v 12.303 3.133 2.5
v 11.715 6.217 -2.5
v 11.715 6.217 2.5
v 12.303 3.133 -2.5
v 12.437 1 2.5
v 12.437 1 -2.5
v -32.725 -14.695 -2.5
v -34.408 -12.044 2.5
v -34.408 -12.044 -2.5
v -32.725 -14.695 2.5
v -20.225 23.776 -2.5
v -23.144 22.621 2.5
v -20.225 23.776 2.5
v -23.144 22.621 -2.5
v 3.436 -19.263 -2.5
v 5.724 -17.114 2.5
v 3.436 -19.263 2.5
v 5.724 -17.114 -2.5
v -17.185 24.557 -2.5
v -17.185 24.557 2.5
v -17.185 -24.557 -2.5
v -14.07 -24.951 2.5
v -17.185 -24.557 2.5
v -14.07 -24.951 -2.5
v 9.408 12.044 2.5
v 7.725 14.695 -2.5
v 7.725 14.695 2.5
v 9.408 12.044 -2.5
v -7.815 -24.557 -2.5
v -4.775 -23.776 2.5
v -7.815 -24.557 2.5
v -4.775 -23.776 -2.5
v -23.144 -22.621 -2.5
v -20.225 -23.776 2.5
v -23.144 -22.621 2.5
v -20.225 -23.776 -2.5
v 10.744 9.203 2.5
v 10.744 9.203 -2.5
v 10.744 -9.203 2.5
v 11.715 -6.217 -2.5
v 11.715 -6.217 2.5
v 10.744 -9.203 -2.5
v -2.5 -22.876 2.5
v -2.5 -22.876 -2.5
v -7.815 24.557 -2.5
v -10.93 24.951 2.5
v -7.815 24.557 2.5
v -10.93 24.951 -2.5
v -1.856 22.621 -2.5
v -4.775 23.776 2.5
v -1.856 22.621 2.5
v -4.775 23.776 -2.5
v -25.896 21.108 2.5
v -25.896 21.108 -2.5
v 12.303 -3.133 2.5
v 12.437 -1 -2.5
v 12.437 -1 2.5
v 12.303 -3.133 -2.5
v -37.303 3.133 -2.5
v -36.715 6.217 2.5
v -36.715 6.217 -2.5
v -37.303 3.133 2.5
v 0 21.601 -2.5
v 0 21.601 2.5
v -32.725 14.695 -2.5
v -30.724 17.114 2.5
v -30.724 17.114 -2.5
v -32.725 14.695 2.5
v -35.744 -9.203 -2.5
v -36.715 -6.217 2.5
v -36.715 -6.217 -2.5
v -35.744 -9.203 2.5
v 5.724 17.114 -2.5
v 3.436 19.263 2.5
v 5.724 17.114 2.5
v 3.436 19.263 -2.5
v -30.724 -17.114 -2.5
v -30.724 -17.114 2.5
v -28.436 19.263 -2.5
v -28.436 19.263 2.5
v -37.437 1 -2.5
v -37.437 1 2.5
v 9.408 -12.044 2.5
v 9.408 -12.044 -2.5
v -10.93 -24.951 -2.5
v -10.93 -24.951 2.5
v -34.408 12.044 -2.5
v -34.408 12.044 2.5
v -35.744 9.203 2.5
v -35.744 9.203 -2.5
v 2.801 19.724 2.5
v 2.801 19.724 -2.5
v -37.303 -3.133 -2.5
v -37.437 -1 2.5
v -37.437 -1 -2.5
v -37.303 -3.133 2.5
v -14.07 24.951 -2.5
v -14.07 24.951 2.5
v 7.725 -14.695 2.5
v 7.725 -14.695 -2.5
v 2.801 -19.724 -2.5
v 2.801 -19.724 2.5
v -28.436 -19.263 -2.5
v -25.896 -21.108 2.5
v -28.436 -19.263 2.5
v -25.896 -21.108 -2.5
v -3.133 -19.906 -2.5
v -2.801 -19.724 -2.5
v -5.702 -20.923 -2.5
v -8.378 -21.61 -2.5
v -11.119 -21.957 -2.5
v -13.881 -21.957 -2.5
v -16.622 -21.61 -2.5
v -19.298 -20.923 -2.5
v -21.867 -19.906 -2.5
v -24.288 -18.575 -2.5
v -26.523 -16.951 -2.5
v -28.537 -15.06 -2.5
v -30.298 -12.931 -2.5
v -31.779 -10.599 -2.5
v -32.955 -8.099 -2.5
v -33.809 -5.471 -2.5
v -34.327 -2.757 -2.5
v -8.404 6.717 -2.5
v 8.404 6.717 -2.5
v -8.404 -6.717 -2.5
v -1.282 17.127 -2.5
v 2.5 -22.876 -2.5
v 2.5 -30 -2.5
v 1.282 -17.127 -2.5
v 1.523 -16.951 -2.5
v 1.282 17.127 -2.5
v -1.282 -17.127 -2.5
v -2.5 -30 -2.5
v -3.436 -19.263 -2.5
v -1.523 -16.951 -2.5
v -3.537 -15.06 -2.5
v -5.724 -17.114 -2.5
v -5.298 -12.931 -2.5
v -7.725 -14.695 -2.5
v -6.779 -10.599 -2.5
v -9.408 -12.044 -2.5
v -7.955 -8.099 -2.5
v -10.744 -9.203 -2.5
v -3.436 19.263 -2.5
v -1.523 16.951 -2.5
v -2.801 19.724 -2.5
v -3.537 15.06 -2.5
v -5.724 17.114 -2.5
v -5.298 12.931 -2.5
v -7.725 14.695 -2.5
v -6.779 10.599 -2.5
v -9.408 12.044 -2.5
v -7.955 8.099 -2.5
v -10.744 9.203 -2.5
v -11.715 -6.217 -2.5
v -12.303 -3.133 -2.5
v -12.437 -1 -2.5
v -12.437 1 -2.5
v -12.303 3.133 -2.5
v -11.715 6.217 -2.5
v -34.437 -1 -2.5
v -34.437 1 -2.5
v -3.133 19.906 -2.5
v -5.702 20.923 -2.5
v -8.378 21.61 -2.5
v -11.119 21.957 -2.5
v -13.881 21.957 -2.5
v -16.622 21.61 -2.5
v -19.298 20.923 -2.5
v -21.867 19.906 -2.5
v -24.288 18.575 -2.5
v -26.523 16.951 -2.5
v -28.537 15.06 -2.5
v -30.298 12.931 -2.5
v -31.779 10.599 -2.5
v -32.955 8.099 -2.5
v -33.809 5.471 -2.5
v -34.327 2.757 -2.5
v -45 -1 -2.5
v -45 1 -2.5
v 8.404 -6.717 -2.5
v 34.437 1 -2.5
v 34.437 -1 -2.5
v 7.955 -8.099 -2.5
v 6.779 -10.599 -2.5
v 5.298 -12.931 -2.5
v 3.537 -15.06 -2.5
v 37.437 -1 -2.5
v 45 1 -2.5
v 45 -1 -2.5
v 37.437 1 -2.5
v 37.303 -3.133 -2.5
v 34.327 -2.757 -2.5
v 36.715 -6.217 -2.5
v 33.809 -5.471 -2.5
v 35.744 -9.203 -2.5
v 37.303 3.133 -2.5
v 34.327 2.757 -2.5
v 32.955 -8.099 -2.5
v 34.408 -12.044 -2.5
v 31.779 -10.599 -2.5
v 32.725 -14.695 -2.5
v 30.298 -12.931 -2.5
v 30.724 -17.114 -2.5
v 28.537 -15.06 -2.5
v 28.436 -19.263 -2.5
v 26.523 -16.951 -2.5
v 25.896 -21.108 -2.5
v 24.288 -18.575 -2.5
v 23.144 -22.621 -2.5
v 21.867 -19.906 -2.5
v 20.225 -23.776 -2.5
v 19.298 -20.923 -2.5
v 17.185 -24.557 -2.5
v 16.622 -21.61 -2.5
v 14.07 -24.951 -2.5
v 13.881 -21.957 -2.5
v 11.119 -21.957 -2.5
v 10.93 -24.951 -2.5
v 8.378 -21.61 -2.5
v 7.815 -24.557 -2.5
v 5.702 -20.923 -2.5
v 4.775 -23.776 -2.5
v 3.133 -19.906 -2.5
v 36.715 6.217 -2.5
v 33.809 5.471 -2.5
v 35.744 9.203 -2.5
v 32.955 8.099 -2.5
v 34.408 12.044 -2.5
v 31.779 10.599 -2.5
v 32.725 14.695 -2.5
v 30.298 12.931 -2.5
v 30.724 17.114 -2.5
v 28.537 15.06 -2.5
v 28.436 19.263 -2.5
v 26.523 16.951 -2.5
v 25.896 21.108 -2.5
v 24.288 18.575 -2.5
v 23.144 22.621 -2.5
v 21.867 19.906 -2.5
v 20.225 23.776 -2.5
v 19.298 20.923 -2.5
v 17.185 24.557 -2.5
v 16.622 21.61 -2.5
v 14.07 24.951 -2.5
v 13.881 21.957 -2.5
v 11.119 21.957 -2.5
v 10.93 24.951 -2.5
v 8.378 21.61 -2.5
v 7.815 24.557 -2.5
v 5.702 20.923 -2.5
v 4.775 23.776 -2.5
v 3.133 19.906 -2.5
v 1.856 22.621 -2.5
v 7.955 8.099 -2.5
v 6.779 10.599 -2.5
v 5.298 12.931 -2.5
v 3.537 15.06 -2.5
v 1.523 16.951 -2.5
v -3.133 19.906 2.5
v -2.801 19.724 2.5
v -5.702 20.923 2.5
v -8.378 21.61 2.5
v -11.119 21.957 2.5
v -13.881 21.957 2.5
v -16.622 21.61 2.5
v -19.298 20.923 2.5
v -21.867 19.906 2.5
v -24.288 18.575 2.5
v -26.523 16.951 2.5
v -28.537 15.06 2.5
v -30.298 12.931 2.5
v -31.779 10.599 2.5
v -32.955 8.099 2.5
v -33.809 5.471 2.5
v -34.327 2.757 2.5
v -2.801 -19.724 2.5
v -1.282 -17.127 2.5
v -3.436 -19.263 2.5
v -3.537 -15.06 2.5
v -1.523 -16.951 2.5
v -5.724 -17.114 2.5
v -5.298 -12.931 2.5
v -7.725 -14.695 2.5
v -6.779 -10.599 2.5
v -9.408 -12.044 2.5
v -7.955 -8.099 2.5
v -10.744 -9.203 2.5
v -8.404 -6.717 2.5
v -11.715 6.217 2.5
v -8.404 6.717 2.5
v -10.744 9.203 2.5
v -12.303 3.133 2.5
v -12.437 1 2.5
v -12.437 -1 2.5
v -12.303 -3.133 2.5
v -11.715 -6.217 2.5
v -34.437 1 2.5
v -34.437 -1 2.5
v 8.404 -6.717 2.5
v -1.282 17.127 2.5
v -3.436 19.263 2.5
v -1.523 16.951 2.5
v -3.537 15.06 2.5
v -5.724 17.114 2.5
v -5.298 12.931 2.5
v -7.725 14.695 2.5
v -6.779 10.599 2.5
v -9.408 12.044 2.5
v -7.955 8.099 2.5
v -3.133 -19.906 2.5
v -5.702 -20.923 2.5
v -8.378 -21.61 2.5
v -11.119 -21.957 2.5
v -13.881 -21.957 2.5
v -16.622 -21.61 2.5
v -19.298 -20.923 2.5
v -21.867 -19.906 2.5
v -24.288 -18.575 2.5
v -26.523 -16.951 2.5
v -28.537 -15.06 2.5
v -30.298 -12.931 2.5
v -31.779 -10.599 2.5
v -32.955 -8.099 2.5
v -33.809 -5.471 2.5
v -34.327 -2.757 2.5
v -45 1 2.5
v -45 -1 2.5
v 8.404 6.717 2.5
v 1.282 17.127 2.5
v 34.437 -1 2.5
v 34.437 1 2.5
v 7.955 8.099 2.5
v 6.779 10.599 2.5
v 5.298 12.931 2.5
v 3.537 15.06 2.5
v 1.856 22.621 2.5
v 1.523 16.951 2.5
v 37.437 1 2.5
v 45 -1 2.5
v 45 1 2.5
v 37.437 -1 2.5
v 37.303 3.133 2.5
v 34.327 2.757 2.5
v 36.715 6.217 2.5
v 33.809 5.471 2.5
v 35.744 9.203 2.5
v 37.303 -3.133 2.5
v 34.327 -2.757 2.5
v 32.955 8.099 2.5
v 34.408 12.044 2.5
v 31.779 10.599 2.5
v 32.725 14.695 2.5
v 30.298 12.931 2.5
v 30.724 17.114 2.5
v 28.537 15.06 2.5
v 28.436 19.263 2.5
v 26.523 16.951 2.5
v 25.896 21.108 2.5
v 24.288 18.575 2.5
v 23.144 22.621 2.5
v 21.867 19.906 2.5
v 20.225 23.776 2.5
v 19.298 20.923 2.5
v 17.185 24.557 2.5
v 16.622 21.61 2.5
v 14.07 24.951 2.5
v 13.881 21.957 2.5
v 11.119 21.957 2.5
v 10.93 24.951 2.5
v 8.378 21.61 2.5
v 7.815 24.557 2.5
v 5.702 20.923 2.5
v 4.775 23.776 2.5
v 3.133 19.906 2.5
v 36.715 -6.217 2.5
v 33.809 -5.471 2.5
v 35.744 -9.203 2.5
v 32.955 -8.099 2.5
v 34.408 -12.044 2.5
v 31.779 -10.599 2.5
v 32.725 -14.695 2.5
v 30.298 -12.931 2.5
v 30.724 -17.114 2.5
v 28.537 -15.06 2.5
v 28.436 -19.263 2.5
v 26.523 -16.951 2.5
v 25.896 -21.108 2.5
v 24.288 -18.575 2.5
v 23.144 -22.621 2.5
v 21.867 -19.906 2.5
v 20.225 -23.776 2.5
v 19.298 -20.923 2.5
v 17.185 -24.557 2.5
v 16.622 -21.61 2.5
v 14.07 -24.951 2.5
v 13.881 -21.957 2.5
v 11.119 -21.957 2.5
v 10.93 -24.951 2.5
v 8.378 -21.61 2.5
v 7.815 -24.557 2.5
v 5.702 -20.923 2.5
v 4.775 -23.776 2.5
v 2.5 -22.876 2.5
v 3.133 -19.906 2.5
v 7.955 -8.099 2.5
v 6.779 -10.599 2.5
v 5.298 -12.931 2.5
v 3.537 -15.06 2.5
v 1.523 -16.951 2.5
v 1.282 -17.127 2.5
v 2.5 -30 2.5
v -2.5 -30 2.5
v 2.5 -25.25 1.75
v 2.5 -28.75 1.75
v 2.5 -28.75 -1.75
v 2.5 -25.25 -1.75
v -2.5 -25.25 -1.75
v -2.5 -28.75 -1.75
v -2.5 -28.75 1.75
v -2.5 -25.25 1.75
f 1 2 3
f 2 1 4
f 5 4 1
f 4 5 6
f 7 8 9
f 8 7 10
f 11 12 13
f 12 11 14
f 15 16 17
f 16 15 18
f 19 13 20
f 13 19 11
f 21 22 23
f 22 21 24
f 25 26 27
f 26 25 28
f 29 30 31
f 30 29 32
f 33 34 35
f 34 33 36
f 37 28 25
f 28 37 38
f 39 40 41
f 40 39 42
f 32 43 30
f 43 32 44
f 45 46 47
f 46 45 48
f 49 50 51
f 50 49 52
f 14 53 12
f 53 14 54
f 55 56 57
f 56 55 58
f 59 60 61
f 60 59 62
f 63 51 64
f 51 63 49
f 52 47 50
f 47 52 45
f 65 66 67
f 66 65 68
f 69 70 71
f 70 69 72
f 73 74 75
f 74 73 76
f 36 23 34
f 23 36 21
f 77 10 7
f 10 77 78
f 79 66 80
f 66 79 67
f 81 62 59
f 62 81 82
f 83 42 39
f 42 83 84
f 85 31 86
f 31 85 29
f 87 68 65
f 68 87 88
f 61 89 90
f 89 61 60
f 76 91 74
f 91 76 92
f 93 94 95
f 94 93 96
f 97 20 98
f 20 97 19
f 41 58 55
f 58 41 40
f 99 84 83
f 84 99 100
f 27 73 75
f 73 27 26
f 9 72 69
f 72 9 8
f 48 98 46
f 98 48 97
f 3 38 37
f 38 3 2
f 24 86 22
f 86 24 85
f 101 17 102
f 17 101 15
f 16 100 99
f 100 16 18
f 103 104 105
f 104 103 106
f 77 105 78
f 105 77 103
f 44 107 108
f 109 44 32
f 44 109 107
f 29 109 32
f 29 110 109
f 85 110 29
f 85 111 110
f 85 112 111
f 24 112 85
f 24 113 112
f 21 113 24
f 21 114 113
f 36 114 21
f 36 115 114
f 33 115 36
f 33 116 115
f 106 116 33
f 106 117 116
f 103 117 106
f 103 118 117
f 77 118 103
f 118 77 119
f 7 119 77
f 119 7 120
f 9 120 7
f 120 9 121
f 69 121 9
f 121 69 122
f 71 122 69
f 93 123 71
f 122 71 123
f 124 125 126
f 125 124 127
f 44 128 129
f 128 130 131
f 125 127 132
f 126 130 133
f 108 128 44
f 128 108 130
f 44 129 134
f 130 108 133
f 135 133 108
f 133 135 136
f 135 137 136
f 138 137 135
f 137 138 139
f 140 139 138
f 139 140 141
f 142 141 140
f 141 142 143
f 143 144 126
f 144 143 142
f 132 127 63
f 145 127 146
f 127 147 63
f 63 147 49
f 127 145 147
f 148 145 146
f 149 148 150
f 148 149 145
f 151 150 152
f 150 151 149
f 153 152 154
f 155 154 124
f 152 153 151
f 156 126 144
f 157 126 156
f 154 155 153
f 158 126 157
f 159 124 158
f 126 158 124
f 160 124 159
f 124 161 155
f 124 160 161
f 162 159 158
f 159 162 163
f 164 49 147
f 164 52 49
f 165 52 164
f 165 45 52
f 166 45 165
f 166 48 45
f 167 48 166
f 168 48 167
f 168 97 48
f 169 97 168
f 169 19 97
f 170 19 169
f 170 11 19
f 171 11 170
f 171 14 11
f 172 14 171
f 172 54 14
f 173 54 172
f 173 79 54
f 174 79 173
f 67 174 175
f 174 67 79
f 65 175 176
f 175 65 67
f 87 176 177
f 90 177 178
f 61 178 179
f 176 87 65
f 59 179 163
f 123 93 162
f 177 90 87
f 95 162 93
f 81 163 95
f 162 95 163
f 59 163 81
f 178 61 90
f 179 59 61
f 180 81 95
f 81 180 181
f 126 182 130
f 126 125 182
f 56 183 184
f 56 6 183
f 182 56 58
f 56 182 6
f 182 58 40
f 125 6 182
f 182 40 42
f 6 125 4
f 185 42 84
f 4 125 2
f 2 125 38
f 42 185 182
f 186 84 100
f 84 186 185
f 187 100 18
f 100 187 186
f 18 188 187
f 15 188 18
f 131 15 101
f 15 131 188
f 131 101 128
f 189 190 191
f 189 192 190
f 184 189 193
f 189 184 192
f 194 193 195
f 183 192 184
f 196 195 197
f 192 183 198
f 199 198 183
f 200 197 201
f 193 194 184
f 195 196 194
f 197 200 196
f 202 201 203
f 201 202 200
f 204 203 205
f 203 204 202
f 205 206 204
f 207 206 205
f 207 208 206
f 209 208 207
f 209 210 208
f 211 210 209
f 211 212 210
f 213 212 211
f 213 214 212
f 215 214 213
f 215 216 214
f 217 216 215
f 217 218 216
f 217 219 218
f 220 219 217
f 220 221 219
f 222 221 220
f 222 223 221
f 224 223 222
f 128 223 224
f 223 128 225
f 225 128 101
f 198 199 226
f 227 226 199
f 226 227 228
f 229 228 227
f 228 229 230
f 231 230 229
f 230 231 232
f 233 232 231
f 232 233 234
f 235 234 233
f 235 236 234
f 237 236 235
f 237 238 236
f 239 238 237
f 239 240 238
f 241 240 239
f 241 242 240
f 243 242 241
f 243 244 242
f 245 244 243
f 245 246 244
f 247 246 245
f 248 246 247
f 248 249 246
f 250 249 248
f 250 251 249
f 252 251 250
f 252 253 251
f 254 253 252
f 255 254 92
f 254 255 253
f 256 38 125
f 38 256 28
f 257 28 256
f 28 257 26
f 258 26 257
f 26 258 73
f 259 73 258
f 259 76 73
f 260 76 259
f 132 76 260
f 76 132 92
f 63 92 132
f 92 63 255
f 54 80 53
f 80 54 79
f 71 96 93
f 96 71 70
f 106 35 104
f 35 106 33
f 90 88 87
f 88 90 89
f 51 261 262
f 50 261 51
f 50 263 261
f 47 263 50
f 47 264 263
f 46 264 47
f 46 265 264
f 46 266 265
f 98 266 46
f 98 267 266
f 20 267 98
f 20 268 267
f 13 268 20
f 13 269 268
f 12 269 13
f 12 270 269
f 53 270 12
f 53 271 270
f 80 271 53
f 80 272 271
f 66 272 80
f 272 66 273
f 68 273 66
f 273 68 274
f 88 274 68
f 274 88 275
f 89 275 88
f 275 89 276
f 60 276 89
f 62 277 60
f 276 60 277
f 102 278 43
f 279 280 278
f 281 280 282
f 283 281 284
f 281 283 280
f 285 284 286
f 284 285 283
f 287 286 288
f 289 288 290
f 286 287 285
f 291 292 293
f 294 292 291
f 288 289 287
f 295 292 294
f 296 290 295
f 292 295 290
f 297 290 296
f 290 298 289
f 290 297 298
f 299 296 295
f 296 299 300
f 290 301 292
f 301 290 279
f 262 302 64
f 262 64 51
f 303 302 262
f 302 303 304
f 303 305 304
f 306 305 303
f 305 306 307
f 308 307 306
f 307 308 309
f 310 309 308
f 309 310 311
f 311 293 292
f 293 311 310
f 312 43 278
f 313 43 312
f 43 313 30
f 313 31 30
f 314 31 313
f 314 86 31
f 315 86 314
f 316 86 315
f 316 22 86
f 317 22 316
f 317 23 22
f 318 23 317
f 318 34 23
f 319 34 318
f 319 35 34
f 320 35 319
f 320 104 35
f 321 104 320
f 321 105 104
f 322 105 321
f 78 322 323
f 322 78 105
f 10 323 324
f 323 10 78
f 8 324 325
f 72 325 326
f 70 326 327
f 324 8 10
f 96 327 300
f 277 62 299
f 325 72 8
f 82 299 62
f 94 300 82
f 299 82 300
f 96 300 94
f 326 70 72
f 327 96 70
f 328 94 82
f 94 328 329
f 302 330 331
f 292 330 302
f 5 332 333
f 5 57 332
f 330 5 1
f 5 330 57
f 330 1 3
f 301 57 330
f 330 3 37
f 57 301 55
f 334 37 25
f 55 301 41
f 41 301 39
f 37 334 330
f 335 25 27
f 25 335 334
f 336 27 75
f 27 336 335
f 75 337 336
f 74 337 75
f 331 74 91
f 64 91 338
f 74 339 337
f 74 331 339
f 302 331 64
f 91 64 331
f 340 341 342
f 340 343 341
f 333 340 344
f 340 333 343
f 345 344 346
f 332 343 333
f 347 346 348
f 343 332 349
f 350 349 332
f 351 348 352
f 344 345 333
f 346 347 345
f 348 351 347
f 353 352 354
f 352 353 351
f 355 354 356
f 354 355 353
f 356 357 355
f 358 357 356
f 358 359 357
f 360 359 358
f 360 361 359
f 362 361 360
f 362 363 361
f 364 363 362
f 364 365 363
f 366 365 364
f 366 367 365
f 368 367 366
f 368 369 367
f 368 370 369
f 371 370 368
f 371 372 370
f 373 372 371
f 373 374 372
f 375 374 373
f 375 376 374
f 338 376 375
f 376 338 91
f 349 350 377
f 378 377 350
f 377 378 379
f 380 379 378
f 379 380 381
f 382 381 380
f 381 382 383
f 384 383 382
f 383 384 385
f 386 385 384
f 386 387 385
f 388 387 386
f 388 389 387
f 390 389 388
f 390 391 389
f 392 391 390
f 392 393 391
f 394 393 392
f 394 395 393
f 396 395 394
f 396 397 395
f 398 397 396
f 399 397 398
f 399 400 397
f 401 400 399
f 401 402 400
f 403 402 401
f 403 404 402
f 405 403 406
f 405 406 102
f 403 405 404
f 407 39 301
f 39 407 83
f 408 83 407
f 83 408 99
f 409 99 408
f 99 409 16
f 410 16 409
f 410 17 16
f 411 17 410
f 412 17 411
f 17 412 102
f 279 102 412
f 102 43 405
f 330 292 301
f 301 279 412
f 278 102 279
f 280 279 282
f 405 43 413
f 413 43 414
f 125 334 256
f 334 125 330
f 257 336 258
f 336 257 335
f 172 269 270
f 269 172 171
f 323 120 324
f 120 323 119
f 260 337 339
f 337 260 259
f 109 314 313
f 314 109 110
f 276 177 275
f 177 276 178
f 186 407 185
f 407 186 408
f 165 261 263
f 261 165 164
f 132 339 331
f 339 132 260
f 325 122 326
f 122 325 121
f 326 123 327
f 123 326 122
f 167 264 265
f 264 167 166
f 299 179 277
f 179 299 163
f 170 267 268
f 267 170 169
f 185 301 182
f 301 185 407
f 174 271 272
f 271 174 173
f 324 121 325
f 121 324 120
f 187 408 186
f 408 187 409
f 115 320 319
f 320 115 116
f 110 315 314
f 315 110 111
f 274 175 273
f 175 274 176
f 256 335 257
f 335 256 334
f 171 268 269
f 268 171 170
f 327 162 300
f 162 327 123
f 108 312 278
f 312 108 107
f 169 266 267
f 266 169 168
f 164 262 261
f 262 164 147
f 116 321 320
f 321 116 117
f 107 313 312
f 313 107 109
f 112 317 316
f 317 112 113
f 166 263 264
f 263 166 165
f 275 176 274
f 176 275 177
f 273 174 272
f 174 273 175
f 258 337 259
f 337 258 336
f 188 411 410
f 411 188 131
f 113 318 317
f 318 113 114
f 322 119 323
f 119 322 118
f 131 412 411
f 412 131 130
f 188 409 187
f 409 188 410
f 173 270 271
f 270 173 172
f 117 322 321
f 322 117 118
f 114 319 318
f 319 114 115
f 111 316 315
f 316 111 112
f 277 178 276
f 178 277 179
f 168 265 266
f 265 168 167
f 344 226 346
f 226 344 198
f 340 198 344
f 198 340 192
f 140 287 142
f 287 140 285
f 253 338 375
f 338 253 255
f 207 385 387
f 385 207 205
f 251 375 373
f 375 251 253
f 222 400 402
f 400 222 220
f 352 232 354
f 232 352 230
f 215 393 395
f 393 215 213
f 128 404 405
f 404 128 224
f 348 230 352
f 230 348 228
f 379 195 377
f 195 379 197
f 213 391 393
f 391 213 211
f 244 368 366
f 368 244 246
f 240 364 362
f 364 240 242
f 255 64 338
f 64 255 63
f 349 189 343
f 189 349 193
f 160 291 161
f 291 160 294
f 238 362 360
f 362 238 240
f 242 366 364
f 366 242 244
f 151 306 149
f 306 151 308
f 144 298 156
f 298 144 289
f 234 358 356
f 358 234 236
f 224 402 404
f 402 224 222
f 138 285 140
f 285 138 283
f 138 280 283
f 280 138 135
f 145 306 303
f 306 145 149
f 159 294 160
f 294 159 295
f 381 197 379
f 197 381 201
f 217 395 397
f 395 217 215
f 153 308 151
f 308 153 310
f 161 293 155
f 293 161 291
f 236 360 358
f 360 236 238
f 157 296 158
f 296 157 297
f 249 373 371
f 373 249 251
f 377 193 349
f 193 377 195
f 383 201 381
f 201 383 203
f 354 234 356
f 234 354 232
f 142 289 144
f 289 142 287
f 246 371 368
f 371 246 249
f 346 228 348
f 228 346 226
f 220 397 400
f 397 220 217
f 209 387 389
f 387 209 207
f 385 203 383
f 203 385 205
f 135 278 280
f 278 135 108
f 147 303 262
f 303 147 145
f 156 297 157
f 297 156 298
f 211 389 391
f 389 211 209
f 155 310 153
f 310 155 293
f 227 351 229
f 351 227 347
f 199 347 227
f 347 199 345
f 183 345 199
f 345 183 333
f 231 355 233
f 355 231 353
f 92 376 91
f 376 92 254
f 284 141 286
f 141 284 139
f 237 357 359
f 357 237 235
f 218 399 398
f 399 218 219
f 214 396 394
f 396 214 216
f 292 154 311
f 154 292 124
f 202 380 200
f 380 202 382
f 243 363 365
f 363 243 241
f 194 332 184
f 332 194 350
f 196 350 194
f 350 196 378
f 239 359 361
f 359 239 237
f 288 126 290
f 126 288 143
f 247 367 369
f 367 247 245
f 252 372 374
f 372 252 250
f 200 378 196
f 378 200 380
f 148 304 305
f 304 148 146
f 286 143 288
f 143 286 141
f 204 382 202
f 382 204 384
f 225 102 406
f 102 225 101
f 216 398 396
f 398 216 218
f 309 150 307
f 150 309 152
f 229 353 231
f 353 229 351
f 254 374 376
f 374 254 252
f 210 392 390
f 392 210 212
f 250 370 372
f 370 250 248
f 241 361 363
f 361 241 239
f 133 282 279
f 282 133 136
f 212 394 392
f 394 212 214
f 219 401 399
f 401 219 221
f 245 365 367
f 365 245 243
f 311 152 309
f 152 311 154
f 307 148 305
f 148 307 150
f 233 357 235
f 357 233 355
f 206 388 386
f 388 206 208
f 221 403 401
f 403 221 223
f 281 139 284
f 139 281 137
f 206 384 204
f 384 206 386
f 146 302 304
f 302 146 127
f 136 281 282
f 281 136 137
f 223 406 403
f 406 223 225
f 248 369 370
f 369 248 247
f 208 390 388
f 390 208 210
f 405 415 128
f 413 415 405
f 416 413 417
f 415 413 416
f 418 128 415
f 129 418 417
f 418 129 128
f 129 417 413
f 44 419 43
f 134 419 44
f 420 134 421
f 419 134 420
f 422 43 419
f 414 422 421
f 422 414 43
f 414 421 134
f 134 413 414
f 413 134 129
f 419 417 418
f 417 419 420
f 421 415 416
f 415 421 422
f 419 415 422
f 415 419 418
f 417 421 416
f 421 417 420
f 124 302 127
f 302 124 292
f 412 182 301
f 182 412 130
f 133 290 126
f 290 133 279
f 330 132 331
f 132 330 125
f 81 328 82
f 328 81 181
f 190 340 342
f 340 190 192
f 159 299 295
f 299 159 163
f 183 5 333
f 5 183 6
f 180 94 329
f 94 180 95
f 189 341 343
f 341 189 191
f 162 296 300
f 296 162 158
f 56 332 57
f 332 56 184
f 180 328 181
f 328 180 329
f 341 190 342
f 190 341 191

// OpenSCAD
$fn=50; //Faces

size=25; //Size of the circles
thickness=5; //Thickness of the amulet

translate([-size/2,0,0]) //Doing the circles
{
	difference()
	{
		cylinder(h=thickness,r=size, center=true); //Circle 1
		cylinder(h=thickness,r=size-3, center=true);
	}
	translate([size,0,0])
	{
		difference()
		{
			cylinder(h=thickness,r=size,center=true); //Circle 2
			cylinder(h=thickness,r=size-3,center=true);
		}
	}
}
	linear_extrude(height = thickness, center = true, convexity = 10, twist = 0) //Extruding the Diamons shape
	{
		projection(cut = true) //cutting from 3d to 2d shape
		{
			rotate([90,0,0])
			{
				cylinder(size-6,25-12,0,$fn=4); //the first PYRAMID
			}
			rotate([-90,0,0])
			{
				cylinder(size-6,25-12,0,$fn=4); //The second PYRAMID
			}
		}
	}
rotate([0,0,90])
{
	cube([2,90,thickness],center = true); //The line
}

translate([0,-size,0]) //The attachment point
{
	rotate([0,90,0])
	{
		difference()
		{
			cube([5,10,5],center=true);
			translate([0,-2,0])
				{
					cube([3.5,3.5,20],center=true);
				}
		}
	}
}
